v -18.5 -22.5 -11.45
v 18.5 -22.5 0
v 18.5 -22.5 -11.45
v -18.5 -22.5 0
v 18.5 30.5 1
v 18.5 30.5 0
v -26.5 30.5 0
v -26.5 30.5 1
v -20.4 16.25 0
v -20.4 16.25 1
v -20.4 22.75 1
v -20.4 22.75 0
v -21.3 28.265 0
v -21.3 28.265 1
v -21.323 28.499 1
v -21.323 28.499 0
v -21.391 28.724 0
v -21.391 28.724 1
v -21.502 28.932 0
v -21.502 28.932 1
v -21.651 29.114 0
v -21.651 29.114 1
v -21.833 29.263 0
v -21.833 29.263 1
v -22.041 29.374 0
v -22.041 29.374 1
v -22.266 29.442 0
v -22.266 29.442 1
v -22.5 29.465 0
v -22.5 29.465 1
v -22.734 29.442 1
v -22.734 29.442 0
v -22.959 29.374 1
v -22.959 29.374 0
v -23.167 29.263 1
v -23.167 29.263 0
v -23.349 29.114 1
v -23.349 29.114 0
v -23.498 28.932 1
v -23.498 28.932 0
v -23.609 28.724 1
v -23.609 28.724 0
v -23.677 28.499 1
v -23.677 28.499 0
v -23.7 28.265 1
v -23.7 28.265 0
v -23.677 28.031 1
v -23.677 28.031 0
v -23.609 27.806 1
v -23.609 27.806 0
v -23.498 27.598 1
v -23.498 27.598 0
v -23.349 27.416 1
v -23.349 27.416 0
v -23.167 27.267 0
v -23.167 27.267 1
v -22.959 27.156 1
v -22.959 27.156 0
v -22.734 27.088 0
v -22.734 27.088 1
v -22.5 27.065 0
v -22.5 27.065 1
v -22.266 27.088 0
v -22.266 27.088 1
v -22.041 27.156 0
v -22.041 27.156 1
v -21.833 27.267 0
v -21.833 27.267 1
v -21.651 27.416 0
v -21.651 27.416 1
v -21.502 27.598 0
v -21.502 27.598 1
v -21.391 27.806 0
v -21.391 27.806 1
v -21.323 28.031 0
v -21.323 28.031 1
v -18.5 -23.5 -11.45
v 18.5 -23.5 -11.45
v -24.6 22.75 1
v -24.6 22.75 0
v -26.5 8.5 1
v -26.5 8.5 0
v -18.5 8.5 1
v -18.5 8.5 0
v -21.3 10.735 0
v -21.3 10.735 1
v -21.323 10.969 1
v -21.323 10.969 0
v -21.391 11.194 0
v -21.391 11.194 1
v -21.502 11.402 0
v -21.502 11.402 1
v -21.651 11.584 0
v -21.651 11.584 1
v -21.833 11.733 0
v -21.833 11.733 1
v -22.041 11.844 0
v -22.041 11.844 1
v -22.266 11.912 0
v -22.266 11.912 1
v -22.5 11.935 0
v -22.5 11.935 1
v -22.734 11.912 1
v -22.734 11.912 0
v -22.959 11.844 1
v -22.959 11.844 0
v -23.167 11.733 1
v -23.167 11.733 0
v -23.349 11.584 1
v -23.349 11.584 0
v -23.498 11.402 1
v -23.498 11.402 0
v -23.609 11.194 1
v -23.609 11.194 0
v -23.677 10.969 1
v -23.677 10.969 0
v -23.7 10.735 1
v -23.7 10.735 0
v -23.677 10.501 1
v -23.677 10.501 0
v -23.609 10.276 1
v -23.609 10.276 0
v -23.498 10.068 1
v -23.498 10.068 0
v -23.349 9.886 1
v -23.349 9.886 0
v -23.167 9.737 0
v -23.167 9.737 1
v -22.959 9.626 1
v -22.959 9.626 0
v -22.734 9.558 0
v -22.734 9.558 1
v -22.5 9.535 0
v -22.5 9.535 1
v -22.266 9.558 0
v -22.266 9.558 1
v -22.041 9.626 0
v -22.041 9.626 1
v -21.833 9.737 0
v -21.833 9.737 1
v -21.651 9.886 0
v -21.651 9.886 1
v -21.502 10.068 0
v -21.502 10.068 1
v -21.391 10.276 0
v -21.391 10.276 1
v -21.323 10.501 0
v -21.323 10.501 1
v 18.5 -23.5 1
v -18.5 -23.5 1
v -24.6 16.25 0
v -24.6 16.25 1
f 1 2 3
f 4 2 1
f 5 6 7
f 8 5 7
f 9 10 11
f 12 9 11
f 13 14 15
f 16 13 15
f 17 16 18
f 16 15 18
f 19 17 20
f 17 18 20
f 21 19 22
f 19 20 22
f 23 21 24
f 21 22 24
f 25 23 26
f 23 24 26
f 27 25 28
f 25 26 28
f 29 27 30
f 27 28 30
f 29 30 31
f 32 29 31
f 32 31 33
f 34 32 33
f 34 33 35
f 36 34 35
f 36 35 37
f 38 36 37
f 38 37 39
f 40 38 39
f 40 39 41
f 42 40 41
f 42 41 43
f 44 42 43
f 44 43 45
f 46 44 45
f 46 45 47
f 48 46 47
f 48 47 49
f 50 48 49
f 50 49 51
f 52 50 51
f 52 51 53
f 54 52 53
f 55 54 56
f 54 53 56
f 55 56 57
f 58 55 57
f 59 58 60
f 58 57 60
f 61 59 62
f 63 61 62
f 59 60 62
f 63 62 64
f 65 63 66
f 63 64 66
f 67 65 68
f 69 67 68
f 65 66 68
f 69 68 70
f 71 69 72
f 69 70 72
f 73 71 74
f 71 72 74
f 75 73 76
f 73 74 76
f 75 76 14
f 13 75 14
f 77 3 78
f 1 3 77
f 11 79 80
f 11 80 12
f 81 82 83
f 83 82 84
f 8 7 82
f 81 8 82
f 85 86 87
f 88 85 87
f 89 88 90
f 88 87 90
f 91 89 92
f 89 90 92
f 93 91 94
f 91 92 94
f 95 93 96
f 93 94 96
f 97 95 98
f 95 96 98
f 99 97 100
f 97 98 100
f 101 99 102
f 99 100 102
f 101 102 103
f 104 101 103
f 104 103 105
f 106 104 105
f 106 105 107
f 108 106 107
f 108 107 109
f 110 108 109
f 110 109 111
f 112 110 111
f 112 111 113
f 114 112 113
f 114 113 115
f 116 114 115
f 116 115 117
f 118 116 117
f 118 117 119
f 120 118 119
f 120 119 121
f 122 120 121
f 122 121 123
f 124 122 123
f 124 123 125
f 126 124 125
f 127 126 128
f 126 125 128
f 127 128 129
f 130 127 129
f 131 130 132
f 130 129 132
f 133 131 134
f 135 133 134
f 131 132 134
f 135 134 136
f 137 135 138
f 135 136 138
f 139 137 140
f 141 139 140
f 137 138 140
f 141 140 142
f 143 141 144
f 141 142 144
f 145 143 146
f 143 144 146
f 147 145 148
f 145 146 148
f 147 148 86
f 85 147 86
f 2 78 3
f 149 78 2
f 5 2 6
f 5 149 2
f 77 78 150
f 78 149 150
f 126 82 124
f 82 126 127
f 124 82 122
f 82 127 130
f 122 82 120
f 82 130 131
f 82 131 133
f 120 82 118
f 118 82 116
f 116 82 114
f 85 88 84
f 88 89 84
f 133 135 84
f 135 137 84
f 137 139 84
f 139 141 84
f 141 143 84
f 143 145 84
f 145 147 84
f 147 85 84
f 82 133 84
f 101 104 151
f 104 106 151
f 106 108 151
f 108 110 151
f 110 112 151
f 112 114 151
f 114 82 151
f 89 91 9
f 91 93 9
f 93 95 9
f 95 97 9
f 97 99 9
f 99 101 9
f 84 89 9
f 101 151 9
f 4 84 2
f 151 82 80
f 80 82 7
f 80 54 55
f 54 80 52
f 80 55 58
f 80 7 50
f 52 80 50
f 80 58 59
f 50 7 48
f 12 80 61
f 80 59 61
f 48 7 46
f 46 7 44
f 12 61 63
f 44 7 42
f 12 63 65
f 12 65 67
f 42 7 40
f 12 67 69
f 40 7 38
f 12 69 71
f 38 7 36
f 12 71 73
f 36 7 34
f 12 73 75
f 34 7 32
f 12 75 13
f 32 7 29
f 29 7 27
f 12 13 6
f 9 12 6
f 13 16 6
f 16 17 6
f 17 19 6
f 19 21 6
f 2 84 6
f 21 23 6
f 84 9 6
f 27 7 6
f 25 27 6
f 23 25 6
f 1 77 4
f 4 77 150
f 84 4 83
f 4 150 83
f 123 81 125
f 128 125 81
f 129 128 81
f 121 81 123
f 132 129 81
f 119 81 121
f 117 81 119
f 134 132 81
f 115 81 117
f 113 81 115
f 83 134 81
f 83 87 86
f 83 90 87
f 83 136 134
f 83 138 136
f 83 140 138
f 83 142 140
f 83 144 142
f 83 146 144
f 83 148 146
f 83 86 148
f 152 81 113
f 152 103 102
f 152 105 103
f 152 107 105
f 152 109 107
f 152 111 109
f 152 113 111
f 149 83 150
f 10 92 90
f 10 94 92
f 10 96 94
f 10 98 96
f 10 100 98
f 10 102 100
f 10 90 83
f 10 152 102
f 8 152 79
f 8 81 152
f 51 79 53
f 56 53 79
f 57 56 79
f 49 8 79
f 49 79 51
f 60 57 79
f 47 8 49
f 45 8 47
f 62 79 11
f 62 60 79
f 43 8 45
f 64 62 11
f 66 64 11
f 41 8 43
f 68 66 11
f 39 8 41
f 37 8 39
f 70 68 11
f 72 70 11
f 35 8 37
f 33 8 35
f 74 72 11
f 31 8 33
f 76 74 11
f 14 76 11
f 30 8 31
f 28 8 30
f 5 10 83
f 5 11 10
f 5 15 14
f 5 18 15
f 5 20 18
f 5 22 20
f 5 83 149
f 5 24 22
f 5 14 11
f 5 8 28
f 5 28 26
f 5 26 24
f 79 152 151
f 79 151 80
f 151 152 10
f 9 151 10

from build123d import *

# Parameters (mm, degrees)
BOSS_EXTRUDE1_DEPTH = 1
SKETCH2_R           = 1.2
SKETCH2_W           = 4.2
SKETCH2_H           = 6.5
CUT_EXTRUDE1_DEPTH  = 11
SKETCH3_W           = 37
SKETCH3_H           = 1
BOSS_EXTRUDE2_DEPTH = 11.45


with BuildPart() as part:
    # Sketch1 → Boss-Extrude1 (new body)
    with BuildSketch(Plane.XY):
        Polygon((18.5, 23.5), (18.5, 30.5), (-18.5, 30.5), (-26.5, 30.5), (-26.5, 8.5), (-18.5, 8.5), (-18.5, -23.5), (18.5, -23.5), align=None)
    extrude(amount=BOSS_EXTRUDE1_DEPTH)

    # Sketch2 → Cut-Extrude1 (cut)
    with BuildSketch(Plane.XY.offset(1)):
        with Locations((-22.5, 10.735)):
            Circle(SKETCH2_R)
        with Locations((-22.5, 28.265)):
            Circle(SKETCH2_R)
        with Locations((-22.5, 19.5)):
            Rectangle(SKETCH2_W, SKETCH2_H)
    extrude(amount=-CUT_EXTRUDE1_DEPTH, mode=Mode.SUBTRACT)

    # Sketch3 → Boss-Extrude2 (add)
    with BuildSketch(Plane(origin=(0, 0, 0), x_dir=(-1, 0, 0), z_dir=(0, 0, -1))):
        with Locations((0, -23)):
            Rectangle(SKETCH3_W, SKETCH3_H)
    extrude(amount=BOSS_EXTRUDE2_DEPTH)


solid = part.part
